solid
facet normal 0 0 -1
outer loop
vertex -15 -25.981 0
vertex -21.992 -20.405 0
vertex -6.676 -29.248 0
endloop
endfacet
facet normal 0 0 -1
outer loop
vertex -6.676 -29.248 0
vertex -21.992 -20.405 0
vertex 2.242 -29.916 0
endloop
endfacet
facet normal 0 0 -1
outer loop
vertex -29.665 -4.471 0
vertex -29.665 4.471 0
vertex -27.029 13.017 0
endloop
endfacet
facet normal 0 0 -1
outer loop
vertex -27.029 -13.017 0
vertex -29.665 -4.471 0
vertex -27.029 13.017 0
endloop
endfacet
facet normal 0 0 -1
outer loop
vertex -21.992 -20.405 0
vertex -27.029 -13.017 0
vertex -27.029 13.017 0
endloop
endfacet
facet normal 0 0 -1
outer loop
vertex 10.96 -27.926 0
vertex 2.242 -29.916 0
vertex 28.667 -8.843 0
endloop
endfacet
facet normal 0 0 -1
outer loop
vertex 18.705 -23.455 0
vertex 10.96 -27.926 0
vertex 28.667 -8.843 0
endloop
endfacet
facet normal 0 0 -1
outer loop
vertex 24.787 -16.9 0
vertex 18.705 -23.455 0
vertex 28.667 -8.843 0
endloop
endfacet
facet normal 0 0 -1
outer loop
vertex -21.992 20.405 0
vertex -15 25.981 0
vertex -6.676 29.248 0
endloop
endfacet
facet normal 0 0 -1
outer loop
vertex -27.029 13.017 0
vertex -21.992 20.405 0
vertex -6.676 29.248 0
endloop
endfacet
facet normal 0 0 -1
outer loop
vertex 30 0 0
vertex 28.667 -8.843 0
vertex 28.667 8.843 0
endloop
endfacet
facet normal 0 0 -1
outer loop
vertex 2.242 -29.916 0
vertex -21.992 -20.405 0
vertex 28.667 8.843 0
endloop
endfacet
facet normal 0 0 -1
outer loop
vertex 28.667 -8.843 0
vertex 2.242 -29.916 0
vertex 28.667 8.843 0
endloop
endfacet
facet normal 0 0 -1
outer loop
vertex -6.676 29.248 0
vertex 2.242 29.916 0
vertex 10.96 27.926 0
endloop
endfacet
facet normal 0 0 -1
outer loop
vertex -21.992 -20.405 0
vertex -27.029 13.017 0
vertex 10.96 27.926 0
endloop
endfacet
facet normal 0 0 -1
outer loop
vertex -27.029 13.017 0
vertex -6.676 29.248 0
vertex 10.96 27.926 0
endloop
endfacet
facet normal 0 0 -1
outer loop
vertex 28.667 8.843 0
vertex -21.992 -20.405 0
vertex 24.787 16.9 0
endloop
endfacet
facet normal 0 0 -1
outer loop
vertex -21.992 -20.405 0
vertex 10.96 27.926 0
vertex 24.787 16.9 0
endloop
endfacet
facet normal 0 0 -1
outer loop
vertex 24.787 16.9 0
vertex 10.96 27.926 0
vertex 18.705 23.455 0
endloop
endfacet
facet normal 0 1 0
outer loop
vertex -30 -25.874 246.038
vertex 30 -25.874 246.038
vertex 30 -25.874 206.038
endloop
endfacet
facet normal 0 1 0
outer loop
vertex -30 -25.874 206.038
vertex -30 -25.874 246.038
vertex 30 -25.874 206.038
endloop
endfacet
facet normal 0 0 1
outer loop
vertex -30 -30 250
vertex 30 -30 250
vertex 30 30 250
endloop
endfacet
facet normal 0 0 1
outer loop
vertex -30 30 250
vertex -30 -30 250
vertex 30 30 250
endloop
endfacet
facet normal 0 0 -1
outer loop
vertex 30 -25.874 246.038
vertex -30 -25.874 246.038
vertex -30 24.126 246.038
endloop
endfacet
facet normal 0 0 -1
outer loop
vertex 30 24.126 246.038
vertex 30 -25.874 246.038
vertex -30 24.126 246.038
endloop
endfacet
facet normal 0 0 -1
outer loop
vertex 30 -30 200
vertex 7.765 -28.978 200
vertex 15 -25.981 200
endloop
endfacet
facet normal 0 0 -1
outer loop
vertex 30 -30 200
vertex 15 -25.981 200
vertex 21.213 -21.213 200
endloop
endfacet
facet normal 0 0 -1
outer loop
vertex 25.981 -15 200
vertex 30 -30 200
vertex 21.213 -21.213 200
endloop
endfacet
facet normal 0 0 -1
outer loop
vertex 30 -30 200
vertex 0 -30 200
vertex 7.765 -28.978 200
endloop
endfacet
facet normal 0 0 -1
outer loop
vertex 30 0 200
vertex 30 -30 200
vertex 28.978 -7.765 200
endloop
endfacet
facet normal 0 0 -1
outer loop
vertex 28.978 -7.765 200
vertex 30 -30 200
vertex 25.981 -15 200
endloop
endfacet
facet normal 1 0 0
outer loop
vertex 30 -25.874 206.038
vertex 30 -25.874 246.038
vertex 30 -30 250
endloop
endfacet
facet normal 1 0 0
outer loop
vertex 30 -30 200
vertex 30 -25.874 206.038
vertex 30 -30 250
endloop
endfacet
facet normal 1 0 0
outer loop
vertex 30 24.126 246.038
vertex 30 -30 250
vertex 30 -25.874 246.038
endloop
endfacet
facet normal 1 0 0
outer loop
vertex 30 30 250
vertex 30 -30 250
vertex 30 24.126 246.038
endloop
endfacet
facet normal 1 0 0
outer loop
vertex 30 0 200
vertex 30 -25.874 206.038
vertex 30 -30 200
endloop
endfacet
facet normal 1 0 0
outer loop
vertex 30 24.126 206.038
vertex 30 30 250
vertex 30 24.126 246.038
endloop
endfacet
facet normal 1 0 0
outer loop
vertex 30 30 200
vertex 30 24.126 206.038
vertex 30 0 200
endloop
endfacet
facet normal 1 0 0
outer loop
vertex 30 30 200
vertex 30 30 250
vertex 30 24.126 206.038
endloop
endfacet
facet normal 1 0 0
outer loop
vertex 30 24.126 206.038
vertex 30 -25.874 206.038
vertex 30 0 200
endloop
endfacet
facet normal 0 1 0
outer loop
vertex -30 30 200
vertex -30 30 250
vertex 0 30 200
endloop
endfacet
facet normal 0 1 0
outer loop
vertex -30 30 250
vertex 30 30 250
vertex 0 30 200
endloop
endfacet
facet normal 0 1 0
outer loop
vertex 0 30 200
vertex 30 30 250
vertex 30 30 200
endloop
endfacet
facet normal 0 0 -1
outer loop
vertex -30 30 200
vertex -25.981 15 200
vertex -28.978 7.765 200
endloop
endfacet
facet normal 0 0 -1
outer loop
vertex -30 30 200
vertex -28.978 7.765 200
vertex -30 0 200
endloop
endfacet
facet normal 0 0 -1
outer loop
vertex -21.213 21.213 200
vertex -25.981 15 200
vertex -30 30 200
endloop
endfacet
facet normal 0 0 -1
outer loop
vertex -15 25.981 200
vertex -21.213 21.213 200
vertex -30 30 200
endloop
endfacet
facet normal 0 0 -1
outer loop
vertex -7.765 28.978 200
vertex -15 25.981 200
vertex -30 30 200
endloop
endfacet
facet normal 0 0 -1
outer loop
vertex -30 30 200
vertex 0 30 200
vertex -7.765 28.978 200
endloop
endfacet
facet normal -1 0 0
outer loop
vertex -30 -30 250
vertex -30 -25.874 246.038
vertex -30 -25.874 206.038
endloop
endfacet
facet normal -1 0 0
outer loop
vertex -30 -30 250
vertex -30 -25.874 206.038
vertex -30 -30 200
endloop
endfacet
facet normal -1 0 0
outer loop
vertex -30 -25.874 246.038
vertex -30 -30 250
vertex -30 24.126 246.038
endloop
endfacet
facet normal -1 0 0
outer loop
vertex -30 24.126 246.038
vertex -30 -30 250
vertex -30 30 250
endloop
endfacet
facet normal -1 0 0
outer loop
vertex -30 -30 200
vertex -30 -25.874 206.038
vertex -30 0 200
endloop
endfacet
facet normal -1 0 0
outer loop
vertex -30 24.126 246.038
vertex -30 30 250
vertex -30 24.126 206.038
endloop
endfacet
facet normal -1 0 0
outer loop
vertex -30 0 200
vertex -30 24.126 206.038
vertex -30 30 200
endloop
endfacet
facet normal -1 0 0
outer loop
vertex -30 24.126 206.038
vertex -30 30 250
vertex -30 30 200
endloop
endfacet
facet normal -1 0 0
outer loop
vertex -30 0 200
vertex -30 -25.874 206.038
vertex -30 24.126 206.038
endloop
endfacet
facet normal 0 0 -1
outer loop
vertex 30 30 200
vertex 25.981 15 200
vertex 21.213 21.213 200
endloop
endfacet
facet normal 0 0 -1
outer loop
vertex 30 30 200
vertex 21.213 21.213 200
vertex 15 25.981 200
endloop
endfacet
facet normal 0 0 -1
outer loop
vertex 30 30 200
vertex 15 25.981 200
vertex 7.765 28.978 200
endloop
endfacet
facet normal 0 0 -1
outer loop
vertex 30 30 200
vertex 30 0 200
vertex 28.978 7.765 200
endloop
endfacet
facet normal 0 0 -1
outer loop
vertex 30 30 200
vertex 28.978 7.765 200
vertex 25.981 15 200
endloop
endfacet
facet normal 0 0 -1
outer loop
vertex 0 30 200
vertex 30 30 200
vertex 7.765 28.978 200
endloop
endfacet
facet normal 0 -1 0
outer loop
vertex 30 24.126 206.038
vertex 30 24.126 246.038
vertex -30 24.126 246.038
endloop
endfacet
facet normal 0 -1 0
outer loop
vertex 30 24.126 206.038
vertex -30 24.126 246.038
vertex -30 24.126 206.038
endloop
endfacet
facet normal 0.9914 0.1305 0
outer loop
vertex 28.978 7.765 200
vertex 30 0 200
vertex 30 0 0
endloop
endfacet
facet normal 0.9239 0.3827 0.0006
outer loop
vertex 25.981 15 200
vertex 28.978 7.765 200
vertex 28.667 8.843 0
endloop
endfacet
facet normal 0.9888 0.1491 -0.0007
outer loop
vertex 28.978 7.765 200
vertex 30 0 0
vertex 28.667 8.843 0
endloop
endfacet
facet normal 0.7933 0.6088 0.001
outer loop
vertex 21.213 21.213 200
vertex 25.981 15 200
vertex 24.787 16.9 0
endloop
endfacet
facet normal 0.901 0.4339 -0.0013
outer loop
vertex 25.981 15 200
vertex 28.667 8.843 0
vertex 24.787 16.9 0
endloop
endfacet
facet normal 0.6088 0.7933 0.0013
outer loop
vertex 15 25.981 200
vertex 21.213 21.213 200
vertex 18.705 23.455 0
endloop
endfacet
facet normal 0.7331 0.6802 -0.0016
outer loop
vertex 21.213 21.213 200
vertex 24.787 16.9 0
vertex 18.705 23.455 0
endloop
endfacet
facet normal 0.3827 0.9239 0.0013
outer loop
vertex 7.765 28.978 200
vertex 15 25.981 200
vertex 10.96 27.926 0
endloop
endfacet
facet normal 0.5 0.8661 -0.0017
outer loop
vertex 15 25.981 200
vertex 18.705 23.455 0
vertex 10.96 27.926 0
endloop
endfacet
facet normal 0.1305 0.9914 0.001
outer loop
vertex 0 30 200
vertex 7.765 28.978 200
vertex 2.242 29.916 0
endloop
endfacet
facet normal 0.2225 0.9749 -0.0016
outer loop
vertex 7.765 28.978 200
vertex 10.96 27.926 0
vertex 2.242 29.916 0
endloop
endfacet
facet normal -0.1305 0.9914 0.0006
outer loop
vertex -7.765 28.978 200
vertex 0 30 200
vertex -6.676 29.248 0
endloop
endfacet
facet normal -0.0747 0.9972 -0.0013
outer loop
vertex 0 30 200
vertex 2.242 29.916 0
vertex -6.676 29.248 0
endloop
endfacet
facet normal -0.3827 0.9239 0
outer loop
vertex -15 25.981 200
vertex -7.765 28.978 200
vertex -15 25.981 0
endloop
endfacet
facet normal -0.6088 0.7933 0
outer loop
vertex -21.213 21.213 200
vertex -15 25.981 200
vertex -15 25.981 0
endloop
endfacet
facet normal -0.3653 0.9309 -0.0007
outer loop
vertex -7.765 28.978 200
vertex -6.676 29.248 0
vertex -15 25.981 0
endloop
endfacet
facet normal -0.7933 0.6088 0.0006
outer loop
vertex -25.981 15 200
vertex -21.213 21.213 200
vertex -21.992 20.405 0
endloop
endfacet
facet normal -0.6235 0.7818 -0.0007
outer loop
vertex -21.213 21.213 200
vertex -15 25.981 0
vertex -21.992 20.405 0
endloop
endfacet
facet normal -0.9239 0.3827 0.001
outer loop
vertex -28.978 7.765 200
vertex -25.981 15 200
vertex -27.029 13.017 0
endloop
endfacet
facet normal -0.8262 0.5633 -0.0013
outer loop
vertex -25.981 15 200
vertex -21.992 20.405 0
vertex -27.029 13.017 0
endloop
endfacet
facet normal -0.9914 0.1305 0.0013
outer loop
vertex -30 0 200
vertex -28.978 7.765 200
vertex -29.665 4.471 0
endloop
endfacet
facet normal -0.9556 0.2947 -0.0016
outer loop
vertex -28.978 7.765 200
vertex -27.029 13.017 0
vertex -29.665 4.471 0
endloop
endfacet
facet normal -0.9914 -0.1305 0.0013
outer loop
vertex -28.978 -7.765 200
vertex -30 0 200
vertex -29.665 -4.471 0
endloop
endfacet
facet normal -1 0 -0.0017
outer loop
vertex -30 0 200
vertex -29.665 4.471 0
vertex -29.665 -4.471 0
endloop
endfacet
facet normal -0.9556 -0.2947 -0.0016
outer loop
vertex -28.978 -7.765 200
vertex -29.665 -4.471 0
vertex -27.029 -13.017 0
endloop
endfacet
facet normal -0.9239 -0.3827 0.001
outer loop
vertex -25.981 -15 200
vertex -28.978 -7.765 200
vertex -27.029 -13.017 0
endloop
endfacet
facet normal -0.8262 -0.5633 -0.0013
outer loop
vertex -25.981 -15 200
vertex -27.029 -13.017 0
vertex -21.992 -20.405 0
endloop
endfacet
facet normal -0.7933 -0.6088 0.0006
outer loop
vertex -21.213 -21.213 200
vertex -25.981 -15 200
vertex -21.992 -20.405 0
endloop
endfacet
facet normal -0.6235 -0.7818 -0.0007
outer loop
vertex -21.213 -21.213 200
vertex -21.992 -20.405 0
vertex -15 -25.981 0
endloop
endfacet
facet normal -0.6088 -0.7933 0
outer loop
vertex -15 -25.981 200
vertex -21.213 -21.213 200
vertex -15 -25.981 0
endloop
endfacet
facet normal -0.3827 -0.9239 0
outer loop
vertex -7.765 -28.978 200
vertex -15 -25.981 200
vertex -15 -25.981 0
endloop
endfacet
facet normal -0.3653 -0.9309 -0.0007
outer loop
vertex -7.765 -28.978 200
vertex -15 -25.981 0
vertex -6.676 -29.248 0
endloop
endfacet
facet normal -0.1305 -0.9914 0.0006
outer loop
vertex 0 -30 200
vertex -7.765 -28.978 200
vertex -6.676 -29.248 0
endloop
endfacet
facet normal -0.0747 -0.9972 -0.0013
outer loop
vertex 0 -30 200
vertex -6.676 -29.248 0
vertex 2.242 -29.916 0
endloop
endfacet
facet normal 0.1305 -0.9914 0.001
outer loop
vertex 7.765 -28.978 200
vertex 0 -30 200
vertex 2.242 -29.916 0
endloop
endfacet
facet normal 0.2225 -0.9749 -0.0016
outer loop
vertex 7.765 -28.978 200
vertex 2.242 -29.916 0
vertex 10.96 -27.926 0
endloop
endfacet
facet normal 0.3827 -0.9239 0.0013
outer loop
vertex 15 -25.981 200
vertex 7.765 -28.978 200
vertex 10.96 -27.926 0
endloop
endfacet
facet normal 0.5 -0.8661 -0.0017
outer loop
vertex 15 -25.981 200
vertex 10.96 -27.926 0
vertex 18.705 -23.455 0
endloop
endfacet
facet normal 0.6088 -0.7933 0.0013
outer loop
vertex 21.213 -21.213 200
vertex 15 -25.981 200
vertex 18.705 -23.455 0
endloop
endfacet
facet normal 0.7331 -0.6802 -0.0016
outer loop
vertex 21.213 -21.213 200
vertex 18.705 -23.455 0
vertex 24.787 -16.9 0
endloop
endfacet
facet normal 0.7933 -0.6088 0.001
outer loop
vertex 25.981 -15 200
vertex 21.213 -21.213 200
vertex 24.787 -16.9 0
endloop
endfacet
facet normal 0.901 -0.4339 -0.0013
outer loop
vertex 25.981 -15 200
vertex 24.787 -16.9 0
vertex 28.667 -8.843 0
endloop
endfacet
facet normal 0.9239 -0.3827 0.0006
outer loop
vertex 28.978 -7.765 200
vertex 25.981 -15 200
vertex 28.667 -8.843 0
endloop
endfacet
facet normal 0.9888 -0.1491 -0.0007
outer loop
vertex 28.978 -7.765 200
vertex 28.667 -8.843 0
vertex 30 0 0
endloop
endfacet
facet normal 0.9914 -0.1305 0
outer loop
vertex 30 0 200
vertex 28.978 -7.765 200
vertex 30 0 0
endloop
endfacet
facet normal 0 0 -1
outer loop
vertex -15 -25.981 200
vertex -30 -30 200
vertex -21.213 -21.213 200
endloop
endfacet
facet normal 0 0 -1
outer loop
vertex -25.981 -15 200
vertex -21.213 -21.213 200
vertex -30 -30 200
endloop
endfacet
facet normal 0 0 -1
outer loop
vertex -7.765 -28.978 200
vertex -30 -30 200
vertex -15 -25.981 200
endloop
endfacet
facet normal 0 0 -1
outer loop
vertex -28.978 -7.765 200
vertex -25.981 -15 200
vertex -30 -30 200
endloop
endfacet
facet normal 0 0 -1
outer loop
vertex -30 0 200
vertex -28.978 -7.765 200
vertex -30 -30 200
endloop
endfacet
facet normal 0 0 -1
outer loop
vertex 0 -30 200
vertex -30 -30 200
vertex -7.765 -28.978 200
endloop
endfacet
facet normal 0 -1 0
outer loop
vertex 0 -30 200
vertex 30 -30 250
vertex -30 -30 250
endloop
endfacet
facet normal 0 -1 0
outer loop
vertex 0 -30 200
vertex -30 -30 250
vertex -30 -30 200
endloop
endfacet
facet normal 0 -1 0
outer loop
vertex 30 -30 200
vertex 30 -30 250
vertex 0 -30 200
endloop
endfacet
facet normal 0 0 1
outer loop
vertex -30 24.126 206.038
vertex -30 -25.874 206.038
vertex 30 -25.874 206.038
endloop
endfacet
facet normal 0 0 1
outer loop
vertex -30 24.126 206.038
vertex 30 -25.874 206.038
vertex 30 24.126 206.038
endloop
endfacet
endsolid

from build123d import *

# Parameters (mm, degrees)
SZKIC1_R                    = 30
DODANIE_WYCI_GNI_CIE1_DEPTH = 200
SZKIC2_W                    = 50
SZKIC2_H                    = 60
DODANIE_WYCI_GNI_CIE2_DEPTH = 30
SZKIC3_W                    = 40
SZKIC3_H                    = 50
WYTNIJ_WYCI_GNI_CIE1_DEPTH  = 61


with BuildPart() as part:
    # Szkic1 → Dodanie-wyciągnięcie1 (new body)
    with BuildSketch(Plane.XY):
        Circle(SZKIC1_R)
    extrude(amount=DODANIE_WYCI_GNI_CIE1_DEPTH)

    # Szkic2 → Dodanie-wyciągnięcie2 (add, symmetric)
    with BuildSketch(Plane(origin=(0, 0, 0), x_dir=(0, 0, -1), z_dir=(1, 0, 0))):
        with Locations((-225, 0)):
            Rectangle(SZKIC2_W, SZKIC2_H)
    extrude(amount=DODANIE_WYCI_GNI_CIE2_DEPTH, both=True)

    # Szkic3 → Wytnij-wyciągnięcie1 (cut, through all)
    with BuildSketch(Plane(origin=(30, 0, 0), x_dir=(0, 0, -1), z_dir=(1, 0, 0))):
        with Locations((-226.037911192, -0.873923737)):
            Rectangle(SZKIC3_W, SZKIC3_H)
    extrude(amount=-WYTNIJ_WYCI_GNI_CIE1_DEPTH, mode=Mode.SUBTRACT)


solid = part.part
